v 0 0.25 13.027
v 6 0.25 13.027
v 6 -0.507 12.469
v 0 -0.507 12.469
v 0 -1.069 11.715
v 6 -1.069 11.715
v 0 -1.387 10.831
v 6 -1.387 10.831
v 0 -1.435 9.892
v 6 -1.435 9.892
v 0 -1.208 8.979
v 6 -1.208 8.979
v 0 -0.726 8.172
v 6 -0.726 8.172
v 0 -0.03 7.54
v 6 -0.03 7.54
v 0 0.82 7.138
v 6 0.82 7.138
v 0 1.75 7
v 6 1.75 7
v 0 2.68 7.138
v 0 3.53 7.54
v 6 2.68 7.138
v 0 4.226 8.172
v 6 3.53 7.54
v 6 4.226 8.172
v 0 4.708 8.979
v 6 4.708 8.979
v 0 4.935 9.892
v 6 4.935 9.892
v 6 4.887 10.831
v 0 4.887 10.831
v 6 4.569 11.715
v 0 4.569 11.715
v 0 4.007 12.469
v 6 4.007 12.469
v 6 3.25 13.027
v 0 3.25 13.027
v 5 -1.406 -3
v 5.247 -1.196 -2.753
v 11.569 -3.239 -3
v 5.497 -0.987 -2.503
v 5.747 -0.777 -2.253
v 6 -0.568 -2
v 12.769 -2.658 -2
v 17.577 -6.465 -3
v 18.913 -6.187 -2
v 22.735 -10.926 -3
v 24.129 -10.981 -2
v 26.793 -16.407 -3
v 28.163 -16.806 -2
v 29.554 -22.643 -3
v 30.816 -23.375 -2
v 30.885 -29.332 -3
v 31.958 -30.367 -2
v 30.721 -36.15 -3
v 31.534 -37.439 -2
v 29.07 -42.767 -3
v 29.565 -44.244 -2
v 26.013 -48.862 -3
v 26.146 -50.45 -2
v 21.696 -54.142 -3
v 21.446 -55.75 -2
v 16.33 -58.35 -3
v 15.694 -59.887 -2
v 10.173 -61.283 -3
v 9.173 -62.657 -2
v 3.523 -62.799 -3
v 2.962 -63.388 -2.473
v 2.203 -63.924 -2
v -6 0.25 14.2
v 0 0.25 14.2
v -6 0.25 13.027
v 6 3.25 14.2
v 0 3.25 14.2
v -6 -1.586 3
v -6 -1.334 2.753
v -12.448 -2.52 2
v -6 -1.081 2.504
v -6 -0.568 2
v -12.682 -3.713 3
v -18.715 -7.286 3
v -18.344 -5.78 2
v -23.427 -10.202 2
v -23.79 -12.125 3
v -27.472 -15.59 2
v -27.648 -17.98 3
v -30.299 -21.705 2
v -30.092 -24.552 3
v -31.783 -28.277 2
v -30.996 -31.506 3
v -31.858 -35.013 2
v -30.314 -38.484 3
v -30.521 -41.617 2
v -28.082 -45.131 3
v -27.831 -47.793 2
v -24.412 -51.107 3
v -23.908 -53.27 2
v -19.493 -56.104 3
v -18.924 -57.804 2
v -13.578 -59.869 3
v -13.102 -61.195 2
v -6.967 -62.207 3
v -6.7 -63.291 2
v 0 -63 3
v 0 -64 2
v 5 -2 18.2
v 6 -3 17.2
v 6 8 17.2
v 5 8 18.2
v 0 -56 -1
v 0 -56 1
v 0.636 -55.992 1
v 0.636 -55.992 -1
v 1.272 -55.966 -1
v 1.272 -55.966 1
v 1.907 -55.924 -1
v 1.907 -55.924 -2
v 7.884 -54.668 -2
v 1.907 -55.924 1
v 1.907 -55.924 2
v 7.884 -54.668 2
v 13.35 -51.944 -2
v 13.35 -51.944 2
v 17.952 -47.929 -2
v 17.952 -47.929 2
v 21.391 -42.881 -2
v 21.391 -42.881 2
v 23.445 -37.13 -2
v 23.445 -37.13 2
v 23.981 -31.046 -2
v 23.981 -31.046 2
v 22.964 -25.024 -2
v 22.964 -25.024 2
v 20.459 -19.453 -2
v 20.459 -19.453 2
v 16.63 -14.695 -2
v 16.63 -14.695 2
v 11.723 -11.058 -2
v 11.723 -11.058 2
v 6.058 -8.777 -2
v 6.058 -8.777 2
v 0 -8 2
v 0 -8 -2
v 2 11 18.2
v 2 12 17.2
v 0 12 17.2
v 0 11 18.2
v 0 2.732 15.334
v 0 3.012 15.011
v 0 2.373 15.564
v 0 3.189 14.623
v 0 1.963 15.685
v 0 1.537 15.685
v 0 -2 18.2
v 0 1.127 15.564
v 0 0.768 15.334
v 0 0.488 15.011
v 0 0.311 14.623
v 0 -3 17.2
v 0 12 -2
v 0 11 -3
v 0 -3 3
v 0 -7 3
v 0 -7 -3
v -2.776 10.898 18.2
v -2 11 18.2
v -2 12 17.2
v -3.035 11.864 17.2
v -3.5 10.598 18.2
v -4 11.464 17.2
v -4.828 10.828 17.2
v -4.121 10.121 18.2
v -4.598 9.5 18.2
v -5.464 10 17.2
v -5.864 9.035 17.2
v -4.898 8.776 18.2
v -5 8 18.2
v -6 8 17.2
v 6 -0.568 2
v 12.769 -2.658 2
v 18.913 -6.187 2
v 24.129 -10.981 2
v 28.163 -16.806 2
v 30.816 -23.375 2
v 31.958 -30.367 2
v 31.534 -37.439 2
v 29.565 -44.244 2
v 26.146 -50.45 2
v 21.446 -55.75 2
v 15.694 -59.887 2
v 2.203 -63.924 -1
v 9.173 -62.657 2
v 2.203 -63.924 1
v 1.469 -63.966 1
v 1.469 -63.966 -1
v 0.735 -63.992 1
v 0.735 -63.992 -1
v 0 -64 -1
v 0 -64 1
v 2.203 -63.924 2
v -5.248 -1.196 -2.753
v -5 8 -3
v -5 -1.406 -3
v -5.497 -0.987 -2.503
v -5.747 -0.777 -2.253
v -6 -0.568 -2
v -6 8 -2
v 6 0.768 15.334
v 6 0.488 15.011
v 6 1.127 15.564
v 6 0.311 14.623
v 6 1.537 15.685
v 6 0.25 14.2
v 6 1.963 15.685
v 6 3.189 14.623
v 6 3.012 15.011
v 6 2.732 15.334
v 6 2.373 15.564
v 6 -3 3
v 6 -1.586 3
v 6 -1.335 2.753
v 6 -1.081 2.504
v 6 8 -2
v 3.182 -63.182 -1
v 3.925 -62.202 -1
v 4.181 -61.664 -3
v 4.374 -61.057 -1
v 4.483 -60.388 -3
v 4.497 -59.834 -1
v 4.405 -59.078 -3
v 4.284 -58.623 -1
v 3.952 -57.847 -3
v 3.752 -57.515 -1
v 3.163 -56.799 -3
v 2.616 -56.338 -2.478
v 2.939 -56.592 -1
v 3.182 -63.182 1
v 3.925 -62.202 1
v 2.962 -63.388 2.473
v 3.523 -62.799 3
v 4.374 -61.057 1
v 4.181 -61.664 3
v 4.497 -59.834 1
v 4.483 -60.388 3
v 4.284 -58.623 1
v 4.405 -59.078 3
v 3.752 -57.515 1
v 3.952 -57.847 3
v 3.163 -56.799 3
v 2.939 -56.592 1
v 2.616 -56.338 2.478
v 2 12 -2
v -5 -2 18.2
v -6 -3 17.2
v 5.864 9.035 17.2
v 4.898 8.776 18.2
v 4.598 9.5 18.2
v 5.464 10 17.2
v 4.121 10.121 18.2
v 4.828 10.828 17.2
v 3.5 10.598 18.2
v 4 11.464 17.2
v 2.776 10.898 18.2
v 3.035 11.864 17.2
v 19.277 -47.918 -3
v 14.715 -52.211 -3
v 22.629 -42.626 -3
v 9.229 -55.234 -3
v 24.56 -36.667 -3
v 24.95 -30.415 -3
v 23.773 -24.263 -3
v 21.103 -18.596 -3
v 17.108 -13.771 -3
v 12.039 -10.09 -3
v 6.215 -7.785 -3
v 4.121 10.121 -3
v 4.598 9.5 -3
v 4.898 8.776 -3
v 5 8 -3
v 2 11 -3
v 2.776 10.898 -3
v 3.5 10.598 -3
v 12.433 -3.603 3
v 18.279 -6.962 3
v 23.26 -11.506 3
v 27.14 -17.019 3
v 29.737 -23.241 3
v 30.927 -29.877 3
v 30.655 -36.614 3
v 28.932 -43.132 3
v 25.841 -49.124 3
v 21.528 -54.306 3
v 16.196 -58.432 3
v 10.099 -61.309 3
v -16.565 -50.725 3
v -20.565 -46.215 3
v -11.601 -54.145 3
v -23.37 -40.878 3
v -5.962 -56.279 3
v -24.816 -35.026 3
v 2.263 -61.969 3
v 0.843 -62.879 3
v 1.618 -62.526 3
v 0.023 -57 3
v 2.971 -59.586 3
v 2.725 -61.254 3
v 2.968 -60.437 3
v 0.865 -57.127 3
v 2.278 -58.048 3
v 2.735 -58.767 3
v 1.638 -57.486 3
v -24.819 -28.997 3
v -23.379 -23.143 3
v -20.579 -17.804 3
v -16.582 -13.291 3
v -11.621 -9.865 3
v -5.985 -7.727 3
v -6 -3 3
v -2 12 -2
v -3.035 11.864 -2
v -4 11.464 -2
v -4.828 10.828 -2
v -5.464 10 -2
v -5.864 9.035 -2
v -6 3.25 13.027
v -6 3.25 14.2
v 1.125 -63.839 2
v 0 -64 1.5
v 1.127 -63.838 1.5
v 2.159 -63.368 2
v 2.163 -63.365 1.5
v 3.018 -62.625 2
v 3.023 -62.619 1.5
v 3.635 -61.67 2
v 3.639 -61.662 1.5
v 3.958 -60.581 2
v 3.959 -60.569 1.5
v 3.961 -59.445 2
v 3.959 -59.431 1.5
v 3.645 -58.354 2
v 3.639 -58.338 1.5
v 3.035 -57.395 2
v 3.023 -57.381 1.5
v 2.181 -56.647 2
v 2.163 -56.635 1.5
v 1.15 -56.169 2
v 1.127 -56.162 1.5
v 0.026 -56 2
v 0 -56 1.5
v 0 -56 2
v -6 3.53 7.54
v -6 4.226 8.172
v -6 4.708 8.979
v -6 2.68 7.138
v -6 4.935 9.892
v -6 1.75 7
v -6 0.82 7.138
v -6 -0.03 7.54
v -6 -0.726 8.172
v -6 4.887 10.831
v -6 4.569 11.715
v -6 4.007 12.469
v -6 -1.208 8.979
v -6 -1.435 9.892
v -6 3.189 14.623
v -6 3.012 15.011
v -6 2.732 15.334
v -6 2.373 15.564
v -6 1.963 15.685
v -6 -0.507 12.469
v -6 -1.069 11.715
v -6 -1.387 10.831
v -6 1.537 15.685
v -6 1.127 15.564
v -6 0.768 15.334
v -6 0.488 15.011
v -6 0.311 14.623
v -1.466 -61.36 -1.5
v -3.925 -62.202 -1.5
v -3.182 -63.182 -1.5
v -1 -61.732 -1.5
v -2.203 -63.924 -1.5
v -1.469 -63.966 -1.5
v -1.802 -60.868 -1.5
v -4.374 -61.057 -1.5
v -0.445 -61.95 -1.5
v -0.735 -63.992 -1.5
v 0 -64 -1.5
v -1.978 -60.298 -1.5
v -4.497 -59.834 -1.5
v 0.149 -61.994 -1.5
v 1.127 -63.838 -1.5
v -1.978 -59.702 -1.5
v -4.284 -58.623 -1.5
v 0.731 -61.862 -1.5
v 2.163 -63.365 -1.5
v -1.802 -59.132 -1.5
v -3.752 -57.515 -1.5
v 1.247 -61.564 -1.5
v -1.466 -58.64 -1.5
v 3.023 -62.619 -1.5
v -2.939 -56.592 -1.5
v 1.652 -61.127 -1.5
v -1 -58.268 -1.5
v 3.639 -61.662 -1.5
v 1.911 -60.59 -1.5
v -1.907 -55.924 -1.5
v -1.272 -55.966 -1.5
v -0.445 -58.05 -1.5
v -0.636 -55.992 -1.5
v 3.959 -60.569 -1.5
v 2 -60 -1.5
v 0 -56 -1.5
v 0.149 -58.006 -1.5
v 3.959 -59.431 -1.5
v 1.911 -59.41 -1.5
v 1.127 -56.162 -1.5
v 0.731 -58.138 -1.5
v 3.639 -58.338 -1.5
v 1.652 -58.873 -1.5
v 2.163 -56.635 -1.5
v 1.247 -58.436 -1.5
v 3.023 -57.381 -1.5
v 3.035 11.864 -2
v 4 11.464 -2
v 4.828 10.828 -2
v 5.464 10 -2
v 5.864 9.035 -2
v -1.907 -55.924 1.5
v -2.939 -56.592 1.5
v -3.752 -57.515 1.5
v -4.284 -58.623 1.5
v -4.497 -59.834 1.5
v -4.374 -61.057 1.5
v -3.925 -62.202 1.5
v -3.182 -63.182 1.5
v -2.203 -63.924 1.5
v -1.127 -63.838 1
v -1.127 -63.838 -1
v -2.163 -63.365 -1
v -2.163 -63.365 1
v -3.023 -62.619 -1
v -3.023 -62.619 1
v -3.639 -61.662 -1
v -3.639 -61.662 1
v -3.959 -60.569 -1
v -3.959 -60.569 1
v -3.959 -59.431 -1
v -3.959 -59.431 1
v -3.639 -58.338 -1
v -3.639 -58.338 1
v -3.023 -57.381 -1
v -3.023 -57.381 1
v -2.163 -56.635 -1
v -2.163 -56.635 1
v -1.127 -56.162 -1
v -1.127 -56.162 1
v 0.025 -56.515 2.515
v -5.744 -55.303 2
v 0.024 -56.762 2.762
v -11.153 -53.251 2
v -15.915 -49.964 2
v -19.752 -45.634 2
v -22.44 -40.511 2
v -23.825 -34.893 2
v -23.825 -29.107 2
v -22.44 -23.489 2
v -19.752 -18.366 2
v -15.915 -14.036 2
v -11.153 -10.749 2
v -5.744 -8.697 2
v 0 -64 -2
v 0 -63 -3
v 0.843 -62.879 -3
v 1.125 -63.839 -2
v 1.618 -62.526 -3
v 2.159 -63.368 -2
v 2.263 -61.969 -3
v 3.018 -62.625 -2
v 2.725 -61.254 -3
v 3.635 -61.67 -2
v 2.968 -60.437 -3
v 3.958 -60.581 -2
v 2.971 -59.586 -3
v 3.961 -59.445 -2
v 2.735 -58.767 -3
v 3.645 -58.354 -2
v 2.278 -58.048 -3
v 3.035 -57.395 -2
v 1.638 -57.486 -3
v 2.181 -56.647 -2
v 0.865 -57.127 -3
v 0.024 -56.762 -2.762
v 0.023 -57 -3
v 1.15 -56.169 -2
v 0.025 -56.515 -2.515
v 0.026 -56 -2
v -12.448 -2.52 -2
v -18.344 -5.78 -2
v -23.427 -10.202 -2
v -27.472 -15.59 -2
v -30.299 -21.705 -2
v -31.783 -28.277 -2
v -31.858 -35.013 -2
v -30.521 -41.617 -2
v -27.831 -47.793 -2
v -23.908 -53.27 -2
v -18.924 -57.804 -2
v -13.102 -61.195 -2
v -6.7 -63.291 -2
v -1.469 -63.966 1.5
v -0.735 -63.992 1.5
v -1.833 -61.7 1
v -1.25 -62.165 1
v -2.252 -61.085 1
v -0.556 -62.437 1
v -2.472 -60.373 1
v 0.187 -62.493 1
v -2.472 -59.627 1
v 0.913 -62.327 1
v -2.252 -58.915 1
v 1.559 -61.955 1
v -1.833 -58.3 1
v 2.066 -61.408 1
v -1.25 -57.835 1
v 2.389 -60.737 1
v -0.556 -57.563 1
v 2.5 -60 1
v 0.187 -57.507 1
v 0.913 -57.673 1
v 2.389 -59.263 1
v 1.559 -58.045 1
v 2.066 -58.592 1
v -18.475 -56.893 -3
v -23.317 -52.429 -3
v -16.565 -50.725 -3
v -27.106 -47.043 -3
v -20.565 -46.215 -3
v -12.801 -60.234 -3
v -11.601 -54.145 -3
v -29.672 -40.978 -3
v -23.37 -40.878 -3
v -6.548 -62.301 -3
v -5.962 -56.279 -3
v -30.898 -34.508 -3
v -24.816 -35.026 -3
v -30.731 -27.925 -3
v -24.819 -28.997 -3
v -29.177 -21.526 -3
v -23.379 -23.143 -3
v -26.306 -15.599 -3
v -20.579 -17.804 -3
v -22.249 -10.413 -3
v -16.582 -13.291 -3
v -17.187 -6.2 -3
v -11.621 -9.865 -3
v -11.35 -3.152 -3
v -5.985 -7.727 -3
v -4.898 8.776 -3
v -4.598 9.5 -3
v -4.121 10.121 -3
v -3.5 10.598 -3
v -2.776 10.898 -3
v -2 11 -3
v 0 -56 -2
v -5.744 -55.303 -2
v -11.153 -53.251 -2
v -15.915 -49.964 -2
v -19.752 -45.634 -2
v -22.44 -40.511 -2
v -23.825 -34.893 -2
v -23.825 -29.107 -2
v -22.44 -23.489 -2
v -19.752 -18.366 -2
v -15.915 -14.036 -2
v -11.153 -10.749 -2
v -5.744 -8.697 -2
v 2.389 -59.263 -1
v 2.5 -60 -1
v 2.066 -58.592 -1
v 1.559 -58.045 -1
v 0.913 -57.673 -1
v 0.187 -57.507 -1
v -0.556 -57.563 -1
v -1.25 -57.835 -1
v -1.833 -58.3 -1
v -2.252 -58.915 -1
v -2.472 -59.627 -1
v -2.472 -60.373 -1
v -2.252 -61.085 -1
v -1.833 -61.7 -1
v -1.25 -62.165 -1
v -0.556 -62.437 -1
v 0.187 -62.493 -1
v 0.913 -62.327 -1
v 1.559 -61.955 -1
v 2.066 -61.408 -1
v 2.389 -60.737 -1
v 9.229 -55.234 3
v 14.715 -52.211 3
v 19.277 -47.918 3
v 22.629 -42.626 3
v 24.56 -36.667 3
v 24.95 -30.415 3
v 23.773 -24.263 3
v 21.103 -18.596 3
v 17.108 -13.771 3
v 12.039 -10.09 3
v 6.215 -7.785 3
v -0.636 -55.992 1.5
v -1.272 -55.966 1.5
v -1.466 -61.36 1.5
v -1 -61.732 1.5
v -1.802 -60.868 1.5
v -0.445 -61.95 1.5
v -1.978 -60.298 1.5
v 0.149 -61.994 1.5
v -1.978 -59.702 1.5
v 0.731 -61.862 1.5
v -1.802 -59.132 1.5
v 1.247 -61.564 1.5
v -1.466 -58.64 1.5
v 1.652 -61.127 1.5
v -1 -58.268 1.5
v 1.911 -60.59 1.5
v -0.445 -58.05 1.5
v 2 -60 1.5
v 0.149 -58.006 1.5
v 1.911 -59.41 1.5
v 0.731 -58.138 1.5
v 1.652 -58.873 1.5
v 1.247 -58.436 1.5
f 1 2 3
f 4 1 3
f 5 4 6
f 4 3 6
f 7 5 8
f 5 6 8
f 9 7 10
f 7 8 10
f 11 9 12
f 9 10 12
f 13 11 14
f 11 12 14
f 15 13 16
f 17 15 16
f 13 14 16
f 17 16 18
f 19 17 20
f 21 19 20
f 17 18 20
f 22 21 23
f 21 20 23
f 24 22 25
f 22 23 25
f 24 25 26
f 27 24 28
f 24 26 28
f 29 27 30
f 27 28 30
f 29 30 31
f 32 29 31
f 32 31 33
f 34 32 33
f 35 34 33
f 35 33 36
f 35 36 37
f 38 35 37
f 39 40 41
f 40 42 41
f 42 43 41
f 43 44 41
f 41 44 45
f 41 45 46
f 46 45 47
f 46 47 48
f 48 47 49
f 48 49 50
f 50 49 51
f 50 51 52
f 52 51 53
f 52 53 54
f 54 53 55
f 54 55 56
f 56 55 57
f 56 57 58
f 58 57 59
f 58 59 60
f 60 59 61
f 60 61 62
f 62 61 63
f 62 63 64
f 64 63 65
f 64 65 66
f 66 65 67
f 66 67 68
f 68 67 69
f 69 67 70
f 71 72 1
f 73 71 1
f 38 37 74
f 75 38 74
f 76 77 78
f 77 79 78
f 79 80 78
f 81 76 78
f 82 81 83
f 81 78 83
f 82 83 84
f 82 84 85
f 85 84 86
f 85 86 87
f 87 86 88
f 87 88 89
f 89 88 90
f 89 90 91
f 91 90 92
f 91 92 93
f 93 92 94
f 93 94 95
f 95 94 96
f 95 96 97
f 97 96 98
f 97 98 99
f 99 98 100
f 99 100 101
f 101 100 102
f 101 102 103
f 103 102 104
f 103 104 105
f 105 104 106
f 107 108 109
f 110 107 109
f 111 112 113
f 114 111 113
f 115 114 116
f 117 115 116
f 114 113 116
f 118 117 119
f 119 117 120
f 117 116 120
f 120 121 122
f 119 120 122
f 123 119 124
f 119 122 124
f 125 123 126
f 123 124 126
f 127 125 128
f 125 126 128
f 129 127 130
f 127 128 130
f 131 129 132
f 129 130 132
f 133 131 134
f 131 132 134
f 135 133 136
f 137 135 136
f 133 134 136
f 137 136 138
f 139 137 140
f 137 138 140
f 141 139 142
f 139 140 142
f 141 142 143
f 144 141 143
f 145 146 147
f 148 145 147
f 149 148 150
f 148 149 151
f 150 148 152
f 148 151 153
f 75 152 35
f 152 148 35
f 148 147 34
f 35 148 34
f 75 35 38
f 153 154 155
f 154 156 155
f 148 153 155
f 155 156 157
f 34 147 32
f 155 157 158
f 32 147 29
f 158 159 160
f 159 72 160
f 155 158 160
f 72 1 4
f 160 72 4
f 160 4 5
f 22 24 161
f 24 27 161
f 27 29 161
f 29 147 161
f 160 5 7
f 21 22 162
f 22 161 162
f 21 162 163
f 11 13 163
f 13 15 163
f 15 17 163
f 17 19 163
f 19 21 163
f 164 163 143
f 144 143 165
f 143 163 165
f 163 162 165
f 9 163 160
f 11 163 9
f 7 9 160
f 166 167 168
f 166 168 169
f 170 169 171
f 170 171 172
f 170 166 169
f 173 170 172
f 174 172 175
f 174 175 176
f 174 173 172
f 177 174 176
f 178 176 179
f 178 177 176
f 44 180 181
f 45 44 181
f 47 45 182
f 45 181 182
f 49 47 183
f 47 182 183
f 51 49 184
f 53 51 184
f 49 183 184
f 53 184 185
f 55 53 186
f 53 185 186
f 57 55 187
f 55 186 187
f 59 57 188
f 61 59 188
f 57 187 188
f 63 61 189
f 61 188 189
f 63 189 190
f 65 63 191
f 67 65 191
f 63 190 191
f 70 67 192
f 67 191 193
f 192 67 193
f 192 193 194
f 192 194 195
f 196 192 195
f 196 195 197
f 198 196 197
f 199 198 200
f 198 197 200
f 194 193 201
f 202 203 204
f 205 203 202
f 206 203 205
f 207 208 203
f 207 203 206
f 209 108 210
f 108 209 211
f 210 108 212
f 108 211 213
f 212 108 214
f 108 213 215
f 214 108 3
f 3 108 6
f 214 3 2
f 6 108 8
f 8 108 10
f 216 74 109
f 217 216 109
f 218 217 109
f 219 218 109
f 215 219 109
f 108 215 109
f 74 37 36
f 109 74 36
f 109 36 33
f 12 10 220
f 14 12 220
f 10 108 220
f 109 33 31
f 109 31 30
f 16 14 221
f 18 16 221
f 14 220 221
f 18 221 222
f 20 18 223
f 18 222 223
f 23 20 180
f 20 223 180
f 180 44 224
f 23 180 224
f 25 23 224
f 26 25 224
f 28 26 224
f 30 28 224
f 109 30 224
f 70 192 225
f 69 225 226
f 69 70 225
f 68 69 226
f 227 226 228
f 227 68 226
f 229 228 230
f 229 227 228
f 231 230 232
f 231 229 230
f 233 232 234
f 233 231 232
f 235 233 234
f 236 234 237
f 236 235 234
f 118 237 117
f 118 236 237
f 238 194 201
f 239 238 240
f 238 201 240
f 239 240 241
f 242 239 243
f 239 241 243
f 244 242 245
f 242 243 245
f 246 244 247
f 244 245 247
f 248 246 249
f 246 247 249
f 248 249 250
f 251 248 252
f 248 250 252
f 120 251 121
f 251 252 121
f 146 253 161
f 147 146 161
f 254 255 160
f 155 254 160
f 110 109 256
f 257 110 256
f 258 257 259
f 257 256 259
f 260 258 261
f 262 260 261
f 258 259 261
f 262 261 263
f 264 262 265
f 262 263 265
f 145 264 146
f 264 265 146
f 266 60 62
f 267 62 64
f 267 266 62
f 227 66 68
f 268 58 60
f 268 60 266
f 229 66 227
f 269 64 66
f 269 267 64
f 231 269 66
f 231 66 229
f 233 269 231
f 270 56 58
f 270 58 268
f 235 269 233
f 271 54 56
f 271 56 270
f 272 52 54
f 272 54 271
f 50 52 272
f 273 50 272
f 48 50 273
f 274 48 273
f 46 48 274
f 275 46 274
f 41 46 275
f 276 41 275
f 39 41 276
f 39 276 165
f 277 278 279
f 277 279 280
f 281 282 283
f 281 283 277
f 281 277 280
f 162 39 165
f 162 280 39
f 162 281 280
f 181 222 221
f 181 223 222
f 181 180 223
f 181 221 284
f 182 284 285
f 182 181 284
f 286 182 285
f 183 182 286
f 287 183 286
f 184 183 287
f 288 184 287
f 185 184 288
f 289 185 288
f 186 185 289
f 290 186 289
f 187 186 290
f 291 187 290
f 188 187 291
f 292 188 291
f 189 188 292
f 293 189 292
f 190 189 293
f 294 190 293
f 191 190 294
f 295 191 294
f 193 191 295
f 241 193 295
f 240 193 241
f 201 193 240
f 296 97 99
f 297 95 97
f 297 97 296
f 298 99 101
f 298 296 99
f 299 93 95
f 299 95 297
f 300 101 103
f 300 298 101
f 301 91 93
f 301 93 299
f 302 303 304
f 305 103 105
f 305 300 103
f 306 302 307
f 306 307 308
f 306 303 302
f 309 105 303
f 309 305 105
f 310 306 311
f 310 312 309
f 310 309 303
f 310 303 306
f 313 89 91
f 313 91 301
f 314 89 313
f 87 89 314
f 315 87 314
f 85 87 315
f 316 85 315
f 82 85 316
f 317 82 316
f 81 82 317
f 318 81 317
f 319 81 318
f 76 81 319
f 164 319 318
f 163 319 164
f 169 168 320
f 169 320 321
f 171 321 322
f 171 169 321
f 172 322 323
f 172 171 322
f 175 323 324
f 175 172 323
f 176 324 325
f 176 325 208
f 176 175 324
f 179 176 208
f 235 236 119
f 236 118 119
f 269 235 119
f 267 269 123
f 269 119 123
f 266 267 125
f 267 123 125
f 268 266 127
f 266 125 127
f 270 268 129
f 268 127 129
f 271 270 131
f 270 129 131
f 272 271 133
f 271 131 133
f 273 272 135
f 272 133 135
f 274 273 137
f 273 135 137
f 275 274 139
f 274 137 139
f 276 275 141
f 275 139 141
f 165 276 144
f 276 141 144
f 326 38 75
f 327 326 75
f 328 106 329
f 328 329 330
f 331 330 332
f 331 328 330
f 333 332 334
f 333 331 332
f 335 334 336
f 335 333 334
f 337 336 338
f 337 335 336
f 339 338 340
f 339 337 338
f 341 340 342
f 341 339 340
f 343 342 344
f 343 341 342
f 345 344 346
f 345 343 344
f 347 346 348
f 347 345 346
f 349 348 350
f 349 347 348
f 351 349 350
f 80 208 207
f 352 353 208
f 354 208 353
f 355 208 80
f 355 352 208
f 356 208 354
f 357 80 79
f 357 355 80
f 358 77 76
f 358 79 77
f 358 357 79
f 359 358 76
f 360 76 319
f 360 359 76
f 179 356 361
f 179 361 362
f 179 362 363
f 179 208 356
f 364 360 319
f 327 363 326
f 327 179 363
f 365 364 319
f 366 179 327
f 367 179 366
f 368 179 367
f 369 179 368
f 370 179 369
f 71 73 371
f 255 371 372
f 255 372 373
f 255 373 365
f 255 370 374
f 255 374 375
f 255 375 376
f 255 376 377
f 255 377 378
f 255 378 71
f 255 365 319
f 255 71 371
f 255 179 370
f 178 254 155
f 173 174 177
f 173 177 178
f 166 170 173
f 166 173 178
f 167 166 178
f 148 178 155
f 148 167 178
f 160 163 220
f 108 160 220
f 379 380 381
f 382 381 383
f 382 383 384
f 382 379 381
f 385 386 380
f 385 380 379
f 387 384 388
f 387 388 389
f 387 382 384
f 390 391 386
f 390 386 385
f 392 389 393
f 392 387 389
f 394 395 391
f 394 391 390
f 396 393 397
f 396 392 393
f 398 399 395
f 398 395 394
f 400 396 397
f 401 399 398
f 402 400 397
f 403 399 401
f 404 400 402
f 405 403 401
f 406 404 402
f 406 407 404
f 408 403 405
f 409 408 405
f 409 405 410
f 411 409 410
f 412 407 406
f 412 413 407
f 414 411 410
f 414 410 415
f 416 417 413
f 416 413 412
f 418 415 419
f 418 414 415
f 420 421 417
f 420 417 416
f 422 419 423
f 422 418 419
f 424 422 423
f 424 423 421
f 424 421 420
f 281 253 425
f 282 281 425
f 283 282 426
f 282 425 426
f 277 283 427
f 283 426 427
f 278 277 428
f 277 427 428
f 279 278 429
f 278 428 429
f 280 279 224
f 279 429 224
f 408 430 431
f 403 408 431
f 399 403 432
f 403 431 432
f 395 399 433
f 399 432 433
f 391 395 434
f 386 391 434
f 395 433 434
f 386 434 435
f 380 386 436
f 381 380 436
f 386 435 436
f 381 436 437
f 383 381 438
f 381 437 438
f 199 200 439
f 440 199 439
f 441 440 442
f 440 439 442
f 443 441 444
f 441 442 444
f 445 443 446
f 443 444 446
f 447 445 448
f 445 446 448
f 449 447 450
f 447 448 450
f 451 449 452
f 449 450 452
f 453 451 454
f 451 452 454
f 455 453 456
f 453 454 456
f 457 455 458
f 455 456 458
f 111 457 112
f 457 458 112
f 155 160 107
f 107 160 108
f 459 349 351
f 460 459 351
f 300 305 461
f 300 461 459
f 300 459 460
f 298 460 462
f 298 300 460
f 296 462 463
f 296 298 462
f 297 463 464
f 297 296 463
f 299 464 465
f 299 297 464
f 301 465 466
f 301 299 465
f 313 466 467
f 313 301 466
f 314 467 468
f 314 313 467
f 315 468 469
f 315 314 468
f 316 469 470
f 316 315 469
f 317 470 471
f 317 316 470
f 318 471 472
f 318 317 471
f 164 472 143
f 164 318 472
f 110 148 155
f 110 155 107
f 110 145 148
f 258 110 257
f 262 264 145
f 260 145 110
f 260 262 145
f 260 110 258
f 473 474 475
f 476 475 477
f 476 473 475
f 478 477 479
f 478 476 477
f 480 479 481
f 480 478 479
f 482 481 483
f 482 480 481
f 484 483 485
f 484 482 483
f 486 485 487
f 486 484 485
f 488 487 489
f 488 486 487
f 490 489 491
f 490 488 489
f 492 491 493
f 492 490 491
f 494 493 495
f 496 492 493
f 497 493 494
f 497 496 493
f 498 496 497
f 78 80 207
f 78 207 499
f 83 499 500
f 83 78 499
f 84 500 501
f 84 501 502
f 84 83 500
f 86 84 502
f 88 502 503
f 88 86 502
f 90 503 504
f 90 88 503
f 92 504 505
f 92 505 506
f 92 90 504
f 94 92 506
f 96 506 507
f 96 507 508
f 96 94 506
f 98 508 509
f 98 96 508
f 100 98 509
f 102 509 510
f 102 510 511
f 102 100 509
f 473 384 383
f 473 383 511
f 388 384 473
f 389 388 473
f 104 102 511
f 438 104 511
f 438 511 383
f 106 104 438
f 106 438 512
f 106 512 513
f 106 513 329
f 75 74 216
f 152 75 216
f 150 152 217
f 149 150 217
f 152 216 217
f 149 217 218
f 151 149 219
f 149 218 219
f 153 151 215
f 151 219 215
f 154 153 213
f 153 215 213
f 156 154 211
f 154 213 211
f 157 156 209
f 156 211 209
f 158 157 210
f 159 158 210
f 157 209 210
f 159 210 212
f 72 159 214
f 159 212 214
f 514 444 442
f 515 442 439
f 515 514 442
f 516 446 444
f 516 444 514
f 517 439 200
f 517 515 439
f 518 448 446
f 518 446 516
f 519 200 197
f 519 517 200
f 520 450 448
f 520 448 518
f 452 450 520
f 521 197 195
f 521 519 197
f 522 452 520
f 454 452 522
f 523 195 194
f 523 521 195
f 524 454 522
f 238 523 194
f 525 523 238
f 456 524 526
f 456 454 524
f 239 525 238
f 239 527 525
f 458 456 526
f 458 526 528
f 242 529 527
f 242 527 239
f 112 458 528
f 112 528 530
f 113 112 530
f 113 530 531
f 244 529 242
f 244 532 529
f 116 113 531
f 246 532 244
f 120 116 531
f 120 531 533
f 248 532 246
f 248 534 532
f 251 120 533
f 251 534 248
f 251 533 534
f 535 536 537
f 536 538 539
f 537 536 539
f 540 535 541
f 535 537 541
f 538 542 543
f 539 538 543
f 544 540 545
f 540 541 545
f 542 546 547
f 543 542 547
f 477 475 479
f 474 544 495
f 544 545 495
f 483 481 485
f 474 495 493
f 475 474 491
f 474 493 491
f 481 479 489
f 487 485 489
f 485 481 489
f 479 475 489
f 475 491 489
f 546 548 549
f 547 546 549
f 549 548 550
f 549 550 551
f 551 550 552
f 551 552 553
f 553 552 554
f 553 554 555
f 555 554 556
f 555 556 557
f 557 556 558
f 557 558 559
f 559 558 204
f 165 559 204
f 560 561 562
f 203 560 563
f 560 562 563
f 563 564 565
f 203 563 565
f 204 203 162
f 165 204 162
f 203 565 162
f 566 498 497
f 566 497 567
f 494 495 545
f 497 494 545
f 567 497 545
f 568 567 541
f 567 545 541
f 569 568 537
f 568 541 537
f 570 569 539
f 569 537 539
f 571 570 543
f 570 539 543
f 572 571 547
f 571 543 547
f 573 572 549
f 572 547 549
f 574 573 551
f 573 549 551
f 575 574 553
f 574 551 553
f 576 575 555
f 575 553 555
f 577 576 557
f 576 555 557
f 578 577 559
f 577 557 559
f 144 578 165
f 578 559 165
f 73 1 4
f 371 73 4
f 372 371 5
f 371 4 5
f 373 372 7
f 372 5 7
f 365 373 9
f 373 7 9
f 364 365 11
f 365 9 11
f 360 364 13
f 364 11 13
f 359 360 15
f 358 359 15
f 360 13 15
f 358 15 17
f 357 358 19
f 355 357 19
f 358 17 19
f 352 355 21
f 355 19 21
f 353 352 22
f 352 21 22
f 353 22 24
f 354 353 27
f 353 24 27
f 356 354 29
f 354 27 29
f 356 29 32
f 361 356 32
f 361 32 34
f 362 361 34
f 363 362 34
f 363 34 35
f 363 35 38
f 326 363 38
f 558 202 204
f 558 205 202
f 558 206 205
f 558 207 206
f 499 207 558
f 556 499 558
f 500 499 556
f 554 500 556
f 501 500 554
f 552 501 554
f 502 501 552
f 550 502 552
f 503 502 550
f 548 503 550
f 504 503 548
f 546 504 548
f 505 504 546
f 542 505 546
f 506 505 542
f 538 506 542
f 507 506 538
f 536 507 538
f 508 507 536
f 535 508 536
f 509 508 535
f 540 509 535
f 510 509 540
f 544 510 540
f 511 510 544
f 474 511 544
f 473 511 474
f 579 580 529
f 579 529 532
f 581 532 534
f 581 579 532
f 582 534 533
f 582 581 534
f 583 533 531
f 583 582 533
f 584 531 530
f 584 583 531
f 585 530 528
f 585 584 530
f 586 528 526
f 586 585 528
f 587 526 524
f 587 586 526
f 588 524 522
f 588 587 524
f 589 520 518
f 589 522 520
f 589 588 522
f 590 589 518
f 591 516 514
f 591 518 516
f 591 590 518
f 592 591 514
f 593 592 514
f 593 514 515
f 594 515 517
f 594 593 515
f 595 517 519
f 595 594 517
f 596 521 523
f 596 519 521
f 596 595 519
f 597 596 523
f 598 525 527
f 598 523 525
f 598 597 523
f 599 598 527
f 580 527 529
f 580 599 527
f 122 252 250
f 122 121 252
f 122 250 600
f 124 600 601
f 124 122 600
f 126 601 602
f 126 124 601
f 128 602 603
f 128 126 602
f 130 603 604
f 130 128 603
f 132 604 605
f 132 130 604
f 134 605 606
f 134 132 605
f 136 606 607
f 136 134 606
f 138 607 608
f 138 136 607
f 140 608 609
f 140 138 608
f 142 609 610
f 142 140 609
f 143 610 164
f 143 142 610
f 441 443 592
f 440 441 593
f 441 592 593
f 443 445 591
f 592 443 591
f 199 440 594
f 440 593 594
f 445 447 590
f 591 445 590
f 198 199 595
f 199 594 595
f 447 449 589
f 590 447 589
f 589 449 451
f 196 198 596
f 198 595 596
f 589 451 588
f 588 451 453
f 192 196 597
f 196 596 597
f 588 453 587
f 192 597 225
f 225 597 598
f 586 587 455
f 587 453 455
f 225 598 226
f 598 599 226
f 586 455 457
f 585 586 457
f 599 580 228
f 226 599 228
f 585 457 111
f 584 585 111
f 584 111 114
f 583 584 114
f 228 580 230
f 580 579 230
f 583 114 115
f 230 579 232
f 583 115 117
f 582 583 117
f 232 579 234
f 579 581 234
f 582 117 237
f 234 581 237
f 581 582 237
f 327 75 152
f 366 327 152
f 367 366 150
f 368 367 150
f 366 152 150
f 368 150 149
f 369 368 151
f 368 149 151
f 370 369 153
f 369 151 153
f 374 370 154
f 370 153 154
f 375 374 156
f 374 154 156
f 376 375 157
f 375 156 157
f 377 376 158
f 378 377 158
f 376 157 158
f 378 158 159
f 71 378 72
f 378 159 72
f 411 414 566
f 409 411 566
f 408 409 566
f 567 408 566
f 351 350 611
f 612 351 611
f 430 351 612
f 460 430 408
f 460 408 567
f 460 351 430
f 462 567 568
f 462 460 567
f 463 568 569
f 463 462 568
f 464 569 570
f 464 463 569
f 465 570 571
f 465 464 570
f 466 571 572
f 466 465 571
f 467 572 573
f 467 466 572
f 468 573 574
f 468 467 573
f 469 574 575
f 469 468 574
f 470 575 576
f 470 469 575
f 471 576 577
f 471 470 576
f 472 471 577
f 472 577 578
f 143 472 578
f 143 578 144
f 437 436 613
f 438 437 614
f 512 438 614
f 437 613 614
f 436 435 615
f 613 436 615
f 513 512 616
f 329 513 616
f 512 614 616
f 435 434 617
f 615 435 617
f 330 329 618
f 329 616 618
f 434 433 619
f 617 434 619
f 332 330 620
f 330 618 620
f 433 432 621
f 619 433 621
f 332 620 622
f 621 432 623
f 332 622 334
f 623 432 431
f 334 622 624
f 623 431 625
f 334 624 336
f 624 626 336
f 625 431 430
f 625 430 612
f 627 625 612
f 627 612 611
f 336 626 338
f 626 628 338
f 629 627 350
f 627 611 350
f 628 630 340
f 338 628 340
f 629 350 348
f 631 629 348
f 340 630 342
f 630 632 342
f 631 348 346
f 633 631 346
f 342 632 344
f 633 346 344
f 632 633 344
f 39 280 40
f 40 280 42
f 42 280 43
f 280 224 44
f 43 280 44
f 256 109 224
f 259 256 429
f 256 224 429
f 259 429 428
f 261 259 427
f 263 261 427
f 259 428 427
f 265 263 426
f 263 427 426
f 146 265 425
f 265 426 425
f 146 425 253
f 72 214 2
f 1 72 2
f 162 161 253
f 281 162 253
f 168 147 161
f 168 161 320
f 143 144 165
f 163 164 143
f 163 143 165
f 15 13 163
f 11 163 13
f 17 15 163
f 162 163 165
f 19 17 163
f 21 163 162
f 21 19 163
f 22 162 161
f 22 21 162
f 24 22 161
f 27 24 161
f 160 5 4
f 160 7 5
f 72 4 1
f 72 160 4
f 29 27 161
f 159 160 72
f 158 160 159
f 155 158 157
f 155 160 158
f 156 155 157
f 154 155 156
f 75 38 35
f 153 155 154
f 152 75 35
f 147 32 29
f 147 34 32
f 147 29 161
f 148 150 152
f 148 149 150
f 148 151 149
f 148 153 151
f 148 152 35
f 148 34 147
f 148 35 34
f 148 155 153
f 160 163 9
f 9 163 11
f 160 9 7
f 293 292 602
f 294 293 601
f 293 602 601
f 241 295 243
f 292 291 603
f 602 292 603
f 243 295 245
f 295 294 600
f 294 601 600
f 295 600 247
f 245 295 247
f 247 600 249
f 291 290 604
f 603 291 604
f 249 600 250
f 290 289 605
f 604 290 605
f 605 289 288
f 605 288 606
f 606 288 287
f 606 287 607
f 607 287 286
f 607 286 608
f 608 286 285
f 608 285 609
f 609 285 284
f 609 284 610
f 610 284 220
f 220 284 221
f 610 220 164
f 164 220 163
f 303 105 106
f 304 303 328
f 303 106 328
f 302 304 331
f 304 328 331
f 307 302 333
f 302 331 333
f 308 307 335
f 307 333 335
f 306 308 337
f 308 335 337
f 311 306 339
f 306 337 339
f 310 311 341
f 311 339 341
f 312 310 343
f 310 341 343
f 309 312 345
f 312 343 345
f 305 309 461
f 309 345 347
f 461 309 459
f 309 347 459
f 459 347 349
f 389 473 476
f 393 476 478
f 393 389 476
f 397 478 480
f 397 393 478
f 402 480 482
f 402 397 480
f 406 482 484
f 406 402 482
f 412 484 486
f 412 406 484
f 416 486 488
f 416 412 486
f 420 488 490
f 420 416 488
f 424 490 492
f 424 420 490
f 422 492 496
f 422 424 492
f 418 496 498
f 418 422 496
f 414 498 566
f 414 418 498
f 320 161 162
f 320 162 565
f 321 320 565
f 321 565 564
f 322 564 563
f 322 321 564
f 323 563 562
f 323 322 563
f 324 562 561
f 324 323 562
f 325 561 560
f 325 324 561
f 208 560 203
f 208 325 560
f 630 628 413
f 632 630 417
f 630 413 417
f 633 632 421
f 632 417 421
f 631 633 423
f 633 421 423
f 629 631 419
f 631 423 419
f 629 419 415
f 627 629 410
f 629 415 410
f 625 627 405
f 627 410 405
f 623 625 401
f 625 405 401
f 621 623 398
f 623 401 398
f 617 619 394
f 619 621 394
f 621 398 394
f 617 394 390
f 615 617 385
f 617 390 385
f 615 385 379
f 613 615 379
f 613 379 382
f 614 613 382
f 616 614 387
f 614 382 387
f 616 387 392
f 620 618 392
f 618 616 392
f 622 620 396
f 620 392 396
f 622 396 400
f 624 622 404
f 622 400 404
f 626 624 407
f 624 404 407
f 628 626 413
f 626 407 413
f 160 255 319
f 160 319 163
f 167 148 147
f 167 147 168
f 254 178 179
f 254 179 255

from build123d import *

# Parameters (mm, degrees)
AUFSATZ_LINEAR_AUSTRAGEN1_DEPTH             = 3
SKIZZE2_R                                   = 4.5
SCHNITT_LINEAR_AUSTRAGEN1_DEPTH             = 1.5
AUFSATZ_LINEAR_AUSTRAGEN2_REACH             = 73.617
SKIZZE3_R                                   = 2
AUFSATZ_LINEAR_AUSTRAGEN2_DIRECTION_2_REACH = 73.617
SKIZZE4_R                                   = 2.5
AUFSATZ_LINEAR_AUSTRAGEN4_DEPTH             = 3
SKIZZE5_R                                   = 4.5
SCHNITT_LINEAR_AUSTRAGEN2_DEPTH             = 2
AUFSATZ_LINEAR_START                        = -6
AUFSATZ_LINEAR_AUSTRAGEN5_DEPTH             = 6
AUFSATZ_LINEAR_AUSTRAGEN6_DEPTH             = 6
AUFSATZ_LINEAR_AUSTRAGEN7_DEPTH             = 15.2
AUFSATZ_LINEAR_START_2                      = 15.2
AUFSATZ_LINEAR_AUSTRAGEN9_DEPTH             = 15.2
SCHNITT_LINEAR_AUSTRAGEN3_DEPTH             = 6.5
FASE1_SIZE                                  = 1
FASE2_SIZE                                  = 1
FASE3_SIZE                                  = 1
FASE4_SIZE                                  = 1
FASE5_SIZE                                  = 1
FASE6_SIZE                                  = 1


# Some blends are built 0.0001 mm under size
with BuildPart() as part:
    # Skizze1 → Aufsatz-Linear austragen1 (new, symmetric)
    with BuildSketch(Plane.XY):
        with BuildLine():
            Line((0, -8), (0, 0))
            ThreePointArc((0, 0), (-32, -32), (0, -64))
            ThreePointArc((0, -64), (4, -60), (0, -56))
            ThreePointArc((0, -56), (-24, -32), (0, -8))
        make_face()
    extrude(amount=AUFSATZ_LINEAR_AUSTRAGEN1_DEPTH, both=True)

    # Skizze2 → Schnitt-Linear austragen1 (cut, symmetric)
    with BuildSketch(Plane.XY):
        with Locations((0, -60)):
            Circle(SKIZZE2_R)
    extrude(amount=SCHNITT_LINEAR_AUSTRAGEN1_DEPTH, both=True, mode=Mode.SUBTRACT)

    # Aufsatz-Linear austragen2: up to this face of the body (flat: up to its plane)
    aufsatz_linear_austragen2_end = Plane(part.part.faces().sort_by_distance((-0.306004635, -59.992467517, 1.5))[0])
    # Skizze3 → Aufsatz-Linear austragen2 (add, up to the picked face)
    with BuildSketch(Plane.XY, mode=Mode.PRIVATE) as aufsatz_linear_austragen2_sk1:
        with Locations((0, -60)):
            Circle(SKIZZE3_R)
    aufsatz_linear_austragen2_tool1 = split(extrude(aufsatz_linear_austragen2_sk1.sketch, amount=AUFSATZ_LINEAR_AUSTRAGEN2_REACH, mode=Mode.PRIVATE), bisect_by=aufsatz_linear_austragen2_end, keep=Keep.BOTH, mode=Mode.PRIVATE)
    add(aufsatz_linear_austragen2_tool1.solids().sort_by(Axis((0, -60, 0), (0, 0, 1)))[0])

    # Aufsatz-Linear austragen2 direction 2: up to this face of the body (flat: up to its plane)
    aufsatz_linear_austragen2_direction_2_end = Plane(part.part.faces().sort_by_distance((-0.306004635, -59.992467517, -1.5))[0])
    # Skizze3 → Aufsatz-Linear austragen2 direction 2 (add, up to the picked face)
    with BuildSketch(Plane.XY, mode=Mode.PRIVATE) as aufsatz_linear_austragen2_direction_2_sk1:
        with Locations((0, -60)):
            Circle(SKIZZE3_R)
    aufsatz_linear_austragen2_direction_2_tool1 = split(extrude(aufsatz_linear_austragen2_direction_2_sk1.sketch, amount=-AUFSATZ_LINEAR_AUSTRAGEN2_DIRECTION_2_REACH, mode=Mode.PRIVATE), bisect_by=aufsatz_linear_austragen2_direction_2_end, keep=Keep.BOTH, mode=Mode.PRIVATE)
    add(aufsatz_linear_austragen2_direction_2_tool1.solids().sort_by(Axis((0, -60, 0), (0, 0, -1)))[0])

    # Skizze7 → Aufsatz-Linear austragen6 (add)
    with BuildSketch(Plane(origin=(0, 0, -3), x_dir=(-1, 0, 0), z_dir=(0, 0, -1)).offset(AUFSATZ_LINEAR_START)):
        with BuildLine():
            Line((0, 0), (0, 12))
            Line((0, 12), (2, 12))
            ThreePointArc((2, 12), (4.828427125, 10.828427125), (6, 8))
            Line((6, 8), (6, -0.567532709))
            ThreePointArc((6, -0.567532709), (3.013390672, -0.142199124), (0, 0))
        make_face()
    extrude(amount=AUFSATZ_LINEAR_AUSTRAGEN6_DEPTH)

    # Skizze9 → Aufsatz-Linear austragen9 (add)
    with BuildSketch(Plane.XY.offset(3).offset(AUFSATZ_LINEAR_START_2)):
        with BuildLine():
            Line((-6, -3), (0, -3))
            Line((0, -3), (0, 12))
            Line((0, 12), (-2, 12))
            ThreePointArc((-2, 12), (-4.828427125, 10.828427125), (-6, 8))
            Line((-6, 8), (-6, -0.567532709))
            Line((-6, -0.567532709), (-6, -3))
        make_face()
    extrude(amount=-AUFSATZ_LINEAR_AUSTRAGEN9_DEPTH)


with BuildPart() as body_2:
    # Skizze4 → Aufsatz-Linear austragen4 (new, symmetric)
    with BuildSketch(Plane.XY):
        with BuildLine():
            Line((0, -8), (0, 0))
            ThreePointArc((0, 0), (32, -32), (0, -64))
            ThreePointArc((0, -64), (-4, -60), (0, -56))
            ThreePointArc((0, -56), (24, -32), (0, -8))
        make_face()
        with Locations((0, -60)):
            Circle(SKIZZE4_R, mode=Mode.SUBTRACT)
    extrude(amount=AUFSATZ_LINEAR_AUSTRAGEN4_DEPTH, both=True)

    # Skizze5 → Schnitt-Linear austragen2 (cut)
    with BuildSketch(Plane.XY.offset(3)):
        with Locations((0, -60)):
            Circle(SKIZZE5_R)
    schnitt_linear_austragen2 = extrude(amount=-SCHNITT_LINEAR_AUSTRAGEN2_DEPTH, mode=Mode.SUBTRACT)

    # Spiegeln1: Schnitt-Linear austragen2 across plane
    add(schnitt_linear_austragen2.mirror(Plane.XY), mode=Mode.SUBTRACT)

    # Skizze6 → Aufsatz-Linear austragen5 (add)
    with BuildSketch(Plane(origin=(0, 0, -3), x_dir=(-1, 0, 0), z_dir=(0, 0, -1)).offset(AUFSATZ_LINEAR_START)):
        with BuildLine():
            Line((0, 0), (0, 12))
            Line((0, 12), (-2, 12))
            ThreePointArc((-2, 12), (-4.828427125, 10.828427125), (-6, 8))
            Line((-6, 8), (-6, -0.567532709))
            ThreePointArc((-6, -0.567532709), (-3.013390672, -0.142199124), (0, 0))
        make_face()
    extrude(amount=AUFSATZ_LINEAR_AUSTRAGEN5_DEPTH)

    # Skizze8 → Aufsatz-Linear austragen7 (add)
    with BuildSketch(Plane.XY.offset(3)):
        with BuildLine():
            Line((0, -3), (6, -3))
            Line((6, -3), (6, 8))
            ThreePointArc((6, 8), (4.828427125, 10.828427125), (2, 12))
            Line((2, 12), (0, 12))
            Line((0, 12), (0, -3))
        make_face()
    extrude(amount=AUFSATZ_LINEAR_AUSTRAGEN7_DEPTH)


with BuildPart() as schnitt_linear_austragen3_tool:
    # Skizze10 → Schnitt-Linear austragen3 (new, symmetric)
    with BuildSketch(Plane(origin=(0, 0, 0), x_dir=(0, 0, -1), z_dir=(1, 0, 0))):
        with BuildLine():
            Line((-14.2, 0.25), (-13.026658805, 0.25))
            ThreePointArc((-13.026658805, 0.25), (-7, 1.75), (-13.026658805, 3.25))
            Line((-13.026658805, 3.25), (-14.2, 3.25))
            ThreePointArc((-14.2, 3.25), (-15.7, 1.75), (-14.2, 0.25))
        make_face()
    extrude(amount=SCHNITT_LINEAR_AUSTRAGEN3_DEPTH, both=True)


with BuildPart() as part_1:
    add(part.part)

    # Schnitt-Linear austragen3: cut by schnitt_linear_austragen3_tool
    add(schnitt_linear_austragen3_tool.part, mode=Mode.SUBTRACT)

    # Fase2
    # the kernel refuses this chamfer: 1 mm, written as the material it takes off along each edge
    with BuildSketch(Plane(origin=(0, -32, 3), x_dir=(0.10711985504033346, -0.9942461147302201, 0), z_dir=(0.9942461147302201, 0.10711985504033346, 0))) as fase2_piece_1:
        Polygon((24, FASE2_SIZE), (24 + FASE2_SIZE, 0), (24, 0), align=None)
    revolve(axis=Axis((0, -32, 3), (0, 0, -1)), revolution_arc=192.298628552, mode=Mode.SUBTRACT)
    with BuildSketch(Plane(origin=(0, -32, -3), x_dir=(0.10711985504033346, -0.9942461147302201, 0), z_dir=(0.9942461147302201, 0.10711985504033346, 0))) as fase2_piece_2:
        Polygon((24, -FASE2_SIZE), (24 + FASE2_SIZE, 0), (24, 0), align=None)
    revolve(axis=Axis((0, -32, -3), (0, 0, -1)), revolution_arc=192.298628552, mode=Mode.SUBTRACT)

    # Fase4
    fase4_edges = [part_1.edges().sort_by_distance(p)[0] for p in [
        (-31.857800876, -35.013390672, 3),
        (-31.857800876, -35.013390672, -3),
        (3.774917218, -61.322875656, 3),
        (-1, 12, -3),
        (-4.828427125, 10.828427125, -3),
        (3.774917218, -61.322875656, -3),
        (-6, 3.716233646, -3),
    ]]
    chamfer(fase4_edges, length=FASE4_SIZE - 0.0001)  # a hair under: the kernel refuses the full size

    # Fase6
    fase6_edges = [part_1.edges().sort_by_distance(p)[0] for p in [
        (-3, -3, 18.2),
        (-4.828427125, 10.828427125, 18.2),
        (-6, 2.5, 18.2),
        (-1, 12, 18.2),
    ]]
    chamfer(fase6_edges, length=FASE6_SIZE)


with BuildPart() as body_2_1:
    add(body_2.part)

    # Schnitt-Linear austragen3: cut by schnitt_linear_austragen3_tool
    add(schnitt_linear_austragen3_tool.part, mode=Mode.SUBTRACT)

    # Fase1
    fase1_edges = [body_2_1.edges().sort_by_distance(p)[0] for p in [
        (23.98101928, -31.045686485, 3),
        (23.98101928, -31.045686485, -3),
    ]]
    chamfer(fase1_edges, length=FASE1_SIZE)

    # Fase3
    fase3_edges = [body_2_1.edges().sort_by_distance(p)[0] for p in [
        (31.942674958, -33.914553878, 3),
        (31.942674958, -33.914553878, -3),
        (1, 12, -3),
        (4.828427125, 10.828427125, -3),
        (6, 3.716233646, -3),
    ]]
    chamfer(fase3_edges, length=FASE3_SIZE)

    # Fase5
    fase5_edges = [body_2_1.edges().sort_by_distance(p)[0] for p in [
        (3, -3, 18.2),
        (6, 2.5, 18.2),
        (4.828427125, 10.828427125, 18.2),
        (1, 12, 18.2),
    ]]
    chamfer(fase5_edges, length=FASE5_SIZE)


solid = Compound([part_1.part, body_2_1.part])
